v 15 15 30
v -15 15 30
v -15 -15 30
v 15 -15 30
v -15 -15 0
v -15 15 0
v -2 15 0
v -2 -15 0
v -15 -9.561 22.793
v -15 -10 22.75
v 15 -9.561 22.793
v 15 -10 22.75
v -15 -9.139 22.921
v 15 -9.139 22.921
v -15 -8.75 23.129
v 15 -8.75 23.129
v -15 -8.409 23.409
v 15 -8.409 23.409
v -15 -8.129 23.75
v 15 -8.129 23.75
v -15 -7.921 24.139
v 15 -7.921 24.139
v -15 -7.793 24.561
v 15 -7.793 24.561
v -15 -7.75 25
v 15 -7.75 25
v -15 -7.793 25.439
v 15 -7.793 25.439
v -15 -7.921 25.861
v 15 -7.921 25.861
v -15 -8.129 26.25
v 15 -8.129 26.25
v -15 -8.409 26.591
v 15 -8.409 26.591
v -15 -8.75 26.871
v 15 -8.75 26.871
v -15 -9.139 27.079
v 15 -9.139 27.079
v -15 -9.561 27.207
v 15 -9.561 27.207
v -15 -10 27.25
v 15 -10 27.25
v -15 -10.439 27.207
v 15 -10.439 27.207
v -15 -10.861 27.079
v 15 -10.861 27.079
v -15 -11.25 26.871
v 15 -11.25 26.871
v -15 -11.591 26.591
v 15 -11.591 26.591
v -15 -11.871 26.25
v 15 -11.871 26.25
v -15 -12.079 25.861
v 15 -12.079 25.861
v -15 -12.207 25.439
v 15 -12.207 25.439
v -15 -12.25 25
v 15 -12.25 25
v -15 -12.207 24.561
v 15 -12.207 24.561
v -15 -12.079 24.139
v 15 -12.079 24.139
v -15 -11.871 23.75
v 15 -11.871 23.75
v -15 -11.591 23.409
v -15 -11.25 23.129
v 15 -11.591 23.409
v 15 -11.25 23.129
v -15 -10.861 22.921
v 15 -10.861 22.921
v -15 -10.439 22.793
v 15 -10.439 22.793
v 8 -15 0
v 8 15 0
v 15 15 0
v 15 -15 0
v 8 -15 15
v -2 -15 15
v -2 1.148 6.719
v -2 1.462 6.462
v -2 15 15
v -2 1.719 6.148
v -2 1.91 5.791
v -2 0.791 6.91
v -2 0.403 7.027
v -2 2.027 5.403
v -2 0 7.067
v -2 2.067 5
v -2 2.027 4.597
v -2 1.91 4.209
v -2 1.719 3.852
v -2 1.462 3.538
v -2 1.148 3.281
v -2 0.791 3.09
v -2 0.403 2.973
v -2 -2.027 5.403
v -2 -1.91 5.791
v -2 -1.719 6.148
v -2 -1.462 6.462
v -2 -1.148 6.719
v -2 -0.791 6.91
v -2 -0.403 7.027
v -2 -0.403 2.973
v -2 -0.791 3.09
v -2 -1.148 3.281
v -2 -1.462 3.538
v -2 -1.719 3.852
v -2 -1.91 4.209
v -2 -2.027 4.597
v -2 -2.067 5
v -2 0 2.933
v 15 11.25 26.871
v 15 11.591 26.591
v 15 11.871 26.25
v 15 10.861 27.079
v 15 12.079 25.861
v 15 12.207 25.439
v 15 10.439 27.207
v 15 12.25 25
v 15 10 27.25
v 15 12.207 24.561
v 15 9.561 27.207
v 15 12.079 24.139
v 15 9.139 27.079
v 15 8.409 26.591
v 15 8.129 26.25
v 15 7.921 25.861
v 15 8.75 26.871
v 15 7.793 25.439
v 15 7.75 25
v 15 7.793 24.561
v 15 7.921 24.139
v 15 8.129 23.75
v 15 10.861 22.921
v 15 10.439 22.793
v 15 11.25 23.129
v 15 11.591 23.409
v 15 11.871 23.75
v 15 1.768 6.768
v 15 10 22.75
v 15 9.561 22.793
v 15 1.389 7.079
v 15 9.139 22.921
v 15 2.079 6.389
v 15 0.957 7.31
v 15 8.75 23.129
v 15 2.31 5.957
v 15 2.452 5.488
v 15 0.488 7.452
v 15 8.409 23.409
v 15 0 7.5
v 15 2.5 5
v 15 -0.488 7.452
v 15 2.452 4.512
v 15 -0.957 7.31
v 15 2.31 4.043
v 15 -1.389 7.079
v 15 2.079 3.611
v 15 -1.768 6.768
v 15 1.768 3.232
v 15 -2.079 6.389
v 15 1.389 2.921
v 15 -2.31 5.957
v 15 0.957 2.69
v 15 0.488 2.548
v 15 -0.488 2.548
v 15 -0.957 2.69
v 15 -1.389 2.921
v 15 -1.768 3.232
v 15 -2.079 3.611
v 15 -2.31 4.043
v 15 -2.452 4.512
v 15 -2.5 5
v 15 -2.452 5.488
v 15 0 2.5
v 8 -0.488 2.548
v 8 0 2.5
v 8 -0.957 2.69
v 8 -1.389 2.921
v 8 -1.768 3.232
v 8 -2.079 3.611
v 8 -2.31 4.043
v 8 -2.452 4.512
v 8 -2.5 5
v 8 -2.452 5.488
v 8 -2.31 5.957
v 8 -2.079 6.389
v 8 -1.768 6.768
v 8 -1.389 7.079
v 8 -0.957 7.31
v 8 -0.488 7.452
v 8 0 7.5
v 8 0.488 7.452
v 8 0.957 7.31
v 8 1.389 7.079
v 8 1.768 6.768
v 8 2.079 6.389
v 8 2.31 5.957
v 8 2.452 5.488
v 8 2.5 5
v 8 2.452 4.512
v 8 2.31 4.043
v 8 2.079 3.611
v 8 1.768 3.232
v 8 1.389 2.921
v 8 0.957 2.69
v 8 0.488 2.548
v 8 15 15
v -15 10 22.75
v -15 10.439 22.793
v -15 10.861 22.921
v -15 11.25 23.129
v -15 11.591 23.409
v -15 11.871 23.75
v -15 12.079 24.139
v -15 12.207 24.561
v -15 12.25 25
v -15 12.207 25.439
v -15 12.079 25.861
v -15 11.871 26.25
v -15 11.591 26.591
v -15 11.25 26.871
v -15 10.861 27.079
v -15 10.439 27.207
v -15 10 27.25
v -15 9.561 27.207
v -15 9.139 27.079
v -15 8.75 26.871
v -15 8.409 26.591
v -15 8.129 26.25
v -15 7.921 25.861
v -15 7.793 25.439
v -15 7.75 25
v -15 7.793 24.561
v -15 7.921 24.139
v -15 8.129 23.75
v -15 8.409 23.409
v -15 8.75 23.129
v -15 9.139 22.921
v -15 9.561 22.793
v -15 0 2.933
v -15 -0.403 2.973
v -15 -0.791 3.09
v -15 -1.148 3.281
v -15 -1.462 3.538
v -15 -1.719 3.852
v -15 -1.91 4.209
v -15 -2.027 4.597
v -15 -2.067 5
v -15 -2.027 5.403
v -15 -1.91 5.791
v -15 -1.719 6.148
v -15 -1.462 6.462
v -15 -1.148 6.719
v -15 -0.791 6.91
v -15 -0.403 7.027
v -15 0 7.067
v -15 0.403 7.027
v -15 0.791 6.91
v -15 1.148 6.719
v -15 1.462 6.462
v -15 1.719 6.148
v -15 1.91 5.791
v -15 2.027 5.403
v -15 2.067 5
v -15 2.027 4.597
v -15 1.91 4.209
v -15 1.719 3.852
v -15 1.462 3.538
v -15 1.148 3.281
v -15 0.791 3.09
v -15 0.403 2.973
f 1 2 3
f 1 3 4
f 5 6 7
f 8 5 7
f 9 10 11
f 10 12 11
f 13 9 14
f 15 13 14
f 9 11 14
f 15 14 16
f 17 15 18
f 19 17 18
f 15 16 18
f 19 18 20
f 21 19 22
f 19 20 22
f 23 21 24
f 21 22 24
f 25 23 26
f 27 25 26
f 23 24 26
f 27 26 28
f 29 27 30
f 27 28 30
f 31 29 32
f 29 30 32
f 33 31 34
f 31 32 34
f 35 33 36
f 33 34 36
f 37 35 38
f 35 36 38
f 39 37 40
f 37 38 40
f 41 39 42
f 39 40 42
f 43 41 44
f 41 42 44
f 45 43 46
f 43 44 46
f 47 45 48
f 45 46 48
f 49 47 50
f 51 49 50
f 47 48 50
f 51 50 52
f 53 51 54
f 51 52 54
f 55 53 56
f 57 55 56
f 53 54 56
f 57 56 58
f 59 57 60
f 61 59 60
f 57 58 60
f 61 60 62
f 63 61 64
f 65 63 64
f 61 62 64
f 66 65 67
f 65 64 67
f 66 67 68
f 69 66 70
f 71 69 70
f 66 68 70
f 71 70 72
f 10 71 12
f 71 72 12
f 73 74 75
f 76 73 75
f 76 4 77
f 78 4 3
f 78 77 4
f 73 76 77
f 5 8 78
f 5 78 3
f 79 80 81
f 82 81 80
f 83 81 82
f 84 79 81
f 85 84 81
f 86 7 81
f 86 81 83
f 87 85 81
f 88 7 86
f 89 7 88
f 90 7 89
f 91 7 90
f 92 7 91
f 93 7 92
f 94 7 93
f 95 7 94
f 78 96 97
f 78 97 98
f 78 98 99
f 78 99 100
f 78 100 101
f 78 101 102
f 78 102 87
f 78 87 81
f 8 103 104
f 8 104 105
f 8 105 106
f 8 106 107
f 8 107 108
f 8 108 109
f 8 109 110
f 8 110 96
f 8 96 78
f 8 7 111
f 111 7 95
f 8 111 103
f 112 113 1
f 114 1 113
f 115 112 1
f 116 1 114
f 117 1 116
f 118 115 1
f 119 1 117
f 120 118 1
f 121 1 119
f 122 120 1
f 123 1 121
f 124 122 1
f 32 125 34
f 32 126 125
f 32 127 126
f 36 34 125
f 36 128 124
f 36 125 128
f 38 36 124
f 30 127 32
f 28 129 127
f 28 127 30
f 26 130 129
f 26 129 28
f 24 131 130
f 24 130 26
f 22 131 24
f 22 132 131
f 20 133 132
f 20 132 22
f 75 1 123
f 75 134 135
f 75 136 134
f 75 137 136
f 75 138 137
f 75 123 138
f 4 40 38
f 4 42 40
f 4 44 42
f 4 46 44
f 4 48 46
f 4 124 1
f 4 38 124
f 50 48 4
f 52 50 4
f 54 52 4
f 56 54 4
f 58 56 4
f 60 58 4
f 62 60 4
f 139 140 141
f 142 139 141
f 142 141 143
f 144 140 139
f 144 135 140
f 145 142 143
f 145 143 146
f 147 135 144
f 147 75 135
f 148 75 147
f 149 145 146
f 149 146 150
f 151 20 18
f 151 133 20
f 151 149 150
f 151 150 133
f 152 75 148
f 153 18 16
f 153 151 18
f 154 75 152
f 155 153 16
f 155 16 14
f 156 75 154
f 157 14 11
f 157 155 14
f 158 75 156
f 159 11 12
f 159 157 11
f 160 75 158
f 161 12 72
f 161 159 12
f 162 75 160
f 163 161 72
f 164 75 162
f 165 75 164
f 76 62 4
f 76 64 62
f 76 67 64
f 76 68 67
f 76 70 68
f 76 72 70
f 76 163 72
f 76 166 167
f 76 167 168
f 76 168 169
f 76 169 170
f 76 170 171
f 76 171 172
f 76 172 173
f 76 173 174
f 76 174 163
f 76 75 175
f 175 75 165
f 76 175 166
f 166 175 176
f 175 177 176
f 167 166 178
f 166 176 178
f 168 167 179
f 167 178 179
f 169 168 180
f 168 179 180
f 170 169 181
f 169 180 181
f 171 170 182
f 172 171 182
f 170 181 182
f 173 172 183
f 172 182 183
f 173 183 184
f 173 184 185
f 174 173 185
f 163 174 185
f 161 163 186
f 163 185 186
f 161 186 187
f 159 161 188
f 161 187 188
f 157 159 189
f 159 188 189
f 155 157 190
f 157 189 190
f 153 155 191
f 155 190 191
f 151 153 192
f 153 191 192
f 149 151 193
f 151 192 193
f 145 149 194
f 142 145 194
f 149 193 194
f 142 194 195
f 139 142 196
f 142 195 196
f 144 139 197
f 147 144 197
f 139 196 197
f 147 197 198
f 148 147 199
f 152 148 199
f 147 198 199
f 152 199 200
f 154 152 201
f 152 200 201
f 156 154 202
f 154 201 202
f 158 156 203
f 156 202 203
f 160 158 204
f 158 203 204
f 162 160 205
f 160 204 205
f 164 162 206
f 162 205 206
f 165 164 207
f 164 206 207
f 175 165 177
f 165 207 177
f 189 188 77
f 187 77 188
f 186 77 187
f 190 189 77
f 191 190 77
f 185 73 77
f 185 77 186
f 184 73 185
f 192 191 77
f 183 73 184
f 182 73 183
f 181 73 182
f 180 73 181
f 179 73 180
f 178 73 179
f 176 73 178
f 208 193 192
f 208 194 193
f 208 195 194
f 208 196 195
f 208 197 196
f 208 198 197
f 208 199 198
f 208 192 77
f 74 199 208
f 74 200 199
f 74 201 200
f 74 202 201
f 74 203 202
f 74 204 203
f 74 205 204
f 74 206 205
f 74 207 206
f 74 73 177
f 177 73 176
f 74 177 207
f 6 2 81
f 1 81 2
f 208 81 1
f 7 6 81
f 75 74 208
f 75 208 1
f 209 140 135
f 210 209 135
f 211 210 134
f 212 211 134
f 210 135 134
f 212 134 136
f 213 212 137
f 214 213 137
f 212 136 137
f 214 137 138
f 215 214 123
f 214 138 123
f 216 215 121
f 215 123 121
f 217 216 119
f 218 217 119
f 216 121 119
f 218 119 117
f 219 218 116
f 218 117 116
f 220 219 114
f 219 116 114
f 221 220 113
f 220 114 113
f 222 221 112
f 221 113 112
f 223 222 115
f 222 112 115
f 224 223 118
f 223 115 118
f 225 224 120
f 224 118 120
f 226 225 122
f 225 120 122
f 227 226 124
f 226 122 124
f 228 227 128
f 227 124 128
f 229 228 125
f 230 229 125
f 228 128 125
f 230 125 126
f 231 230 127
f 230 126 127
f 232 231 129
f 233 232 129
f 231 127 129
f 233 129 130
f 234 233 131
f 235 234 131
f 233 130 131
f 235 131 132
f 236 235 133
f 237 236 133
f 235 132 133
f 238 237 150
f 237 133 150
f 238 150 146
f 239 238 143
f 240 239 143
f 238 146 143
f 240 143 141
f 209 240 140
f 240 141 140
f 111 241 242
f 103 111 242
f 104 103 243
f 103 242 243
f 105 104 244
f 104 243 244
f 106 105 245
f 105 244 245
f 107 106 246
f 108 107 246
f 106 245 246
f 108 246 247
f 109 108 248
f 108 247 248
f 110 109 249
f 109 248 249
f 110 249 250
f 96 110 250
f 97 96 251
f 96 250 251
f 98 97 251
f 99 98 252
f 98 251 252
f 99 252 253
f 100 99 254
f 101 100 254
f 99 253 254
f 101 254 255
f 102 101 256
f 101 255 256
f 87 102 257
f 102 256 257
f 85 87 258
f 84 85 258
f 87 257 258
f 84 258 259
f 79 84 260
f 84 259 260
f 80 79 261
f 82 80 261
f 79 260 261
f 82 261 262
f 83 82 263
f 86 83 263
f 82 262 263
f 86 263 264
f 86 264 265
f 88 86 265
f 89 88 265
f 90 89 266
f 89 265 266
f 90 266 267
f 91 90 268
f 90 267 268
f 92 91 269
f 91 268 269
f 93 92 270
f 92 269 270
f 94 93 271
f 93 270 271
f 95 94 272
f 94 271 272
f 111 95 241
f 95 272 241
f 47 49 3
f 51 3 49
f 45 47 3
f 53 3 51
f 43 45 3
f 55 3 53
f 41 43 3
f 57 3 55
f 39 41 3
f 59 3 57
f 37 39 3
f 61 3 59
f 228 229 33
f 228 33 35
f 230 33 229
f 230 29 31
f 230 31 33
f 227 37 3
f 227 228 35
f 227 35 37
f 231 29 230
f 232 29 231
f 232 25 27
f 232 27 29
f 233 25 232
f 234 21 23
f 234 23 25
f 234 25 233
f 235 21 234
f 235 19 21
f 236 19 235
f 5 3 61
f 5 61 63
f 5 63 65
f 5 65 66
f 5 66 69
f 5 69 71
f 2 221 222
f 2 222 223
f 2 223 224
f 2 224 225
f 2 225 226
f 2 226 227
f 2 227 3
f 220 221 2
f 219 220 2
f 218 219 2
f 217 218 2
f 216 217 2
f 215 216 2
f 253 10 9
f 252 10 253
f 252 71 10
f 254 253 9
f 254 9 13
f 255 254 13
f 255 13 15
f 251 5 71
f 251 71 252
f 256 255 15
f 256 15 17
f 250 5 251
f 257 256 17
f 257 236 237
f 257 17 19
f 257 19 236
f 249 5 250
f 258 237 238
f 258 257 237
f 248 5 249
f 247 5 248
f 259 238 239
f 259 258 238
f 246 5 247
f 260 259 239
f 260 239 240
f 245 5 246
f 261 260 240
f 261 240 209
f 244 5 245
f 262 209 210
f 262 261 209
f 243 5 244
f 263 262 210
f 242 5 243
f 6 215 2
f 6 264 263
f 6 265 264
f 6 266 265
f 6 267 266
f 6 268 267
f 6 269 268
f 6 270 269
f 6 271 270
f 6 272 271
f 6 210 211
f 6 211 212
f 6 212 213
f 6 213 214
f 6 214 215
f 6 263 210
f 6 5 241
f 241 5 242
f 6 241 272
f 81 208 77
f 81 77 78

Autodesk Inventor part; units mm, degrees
ref_plane "YZ Plane" through (0, 0, 0) normal (1, 0, 0) x (0, 1, 0)
ref_plane "XZ Plane" through (0, 0, 0) normal (0, 1, 0) x (-1, 0, 0)
ref_plane "XY Plane" through (0, 0, 0) normal (0, 0, 1) x (1, 0, 0)
sketch "Sketch1" plane through (0, 0, 0) normal (0, 0, 1) x (1, 0, 0)
  line L0 (-15, 15) -> (15, 15)
  line L1 (15, 15) -> (15, -15)
  line L2 (15, -15) -> (-15, -15)
  line L3 (-15, -15) -> (-15, 15)
  point P0 (0, 0)
  point P1 (0, 15)
  point P2 (-15, 0)
  dimension "d0" = 30
  dimension "d1" = 30
extrude "Extrusion1" add sketch "Sketch1" along normal blind 30
sketch "Sketch6" plane through (15, -15, 0) normal (1, 0, 0) x (0, 0, -1)
  circle A0 centre (-25, 5) radius 2.25
  circle A1 centre (-25, 25) radius 2.25
  line L0 (-30, 0) -> (-30, 30) projected
  line L1 (0, 0) -> (-30, 0) projected
  line L2 (0, 30) -> (-30, 30) projected
  point P0 (0, 15)
  dimension "d19" = 4.5
  dimension "d20" = 5
  dimension "d21" = 5
  dimension "d22" = 5
extrude "Extrusion4" cut sketch "Sketch6" against normal through all
sketch "Sketch4" plane through (0, 0, 0) normal (0, 0, -1) x (-1, 0, 0)
  line L0 (2, -15) -> (-8, -15)
  line L1 (-8, -15) -> (-8, 15)
  line L2 (-8, 15) -> (2, 15)
  line L3 (2, 15) -> (2, -15)
  line L4 (15, -15) -> (-15, -15) projected
  line L5 (-15, 15) -> (15, 15) projected
  line L6 (-15, -15) -> (-15, 15) projected
  point P0 (0, 0)
  dimension "d8" = 10
  dimension "d25" = 7
extrude "Extrusion3" cut sketch "Sketch4" against normal blind 15 contours L0 L1 L2 L3
sketch "Sketch5" plane through (15, -15, 0) normal (1, 0, 0) x (0, 0, -1)
  line L0 (0, 0) -> (0, 30) projected
  point P0 (0, 15)
  point P1 (-5, 15)
  point P2 (0, 15)
  dimension "d11" = 5
hole "Hole1" at (15, 0, 5) direction (-1, 0, 0) diameter 5 depth 10 tip angle 118
sketch "Sketch7" plane through (-2, -15, 0) normal (1, 0, 0) x (0, 0, -1)
  circle A0 centre (-5, 15) radius 2.5 projected
  point P0 (0, 15)
hole "Hole2" at (-2, 0, 5) direction (-1, 0, 0) diameter 4.134 end through all thread size "M5x0.8" class "6H" standard "ISO Metric profile"
equation "\"d22\" = d21"
properties part number "0005-10-018 intinzator x" material "Wood (Maple)"
